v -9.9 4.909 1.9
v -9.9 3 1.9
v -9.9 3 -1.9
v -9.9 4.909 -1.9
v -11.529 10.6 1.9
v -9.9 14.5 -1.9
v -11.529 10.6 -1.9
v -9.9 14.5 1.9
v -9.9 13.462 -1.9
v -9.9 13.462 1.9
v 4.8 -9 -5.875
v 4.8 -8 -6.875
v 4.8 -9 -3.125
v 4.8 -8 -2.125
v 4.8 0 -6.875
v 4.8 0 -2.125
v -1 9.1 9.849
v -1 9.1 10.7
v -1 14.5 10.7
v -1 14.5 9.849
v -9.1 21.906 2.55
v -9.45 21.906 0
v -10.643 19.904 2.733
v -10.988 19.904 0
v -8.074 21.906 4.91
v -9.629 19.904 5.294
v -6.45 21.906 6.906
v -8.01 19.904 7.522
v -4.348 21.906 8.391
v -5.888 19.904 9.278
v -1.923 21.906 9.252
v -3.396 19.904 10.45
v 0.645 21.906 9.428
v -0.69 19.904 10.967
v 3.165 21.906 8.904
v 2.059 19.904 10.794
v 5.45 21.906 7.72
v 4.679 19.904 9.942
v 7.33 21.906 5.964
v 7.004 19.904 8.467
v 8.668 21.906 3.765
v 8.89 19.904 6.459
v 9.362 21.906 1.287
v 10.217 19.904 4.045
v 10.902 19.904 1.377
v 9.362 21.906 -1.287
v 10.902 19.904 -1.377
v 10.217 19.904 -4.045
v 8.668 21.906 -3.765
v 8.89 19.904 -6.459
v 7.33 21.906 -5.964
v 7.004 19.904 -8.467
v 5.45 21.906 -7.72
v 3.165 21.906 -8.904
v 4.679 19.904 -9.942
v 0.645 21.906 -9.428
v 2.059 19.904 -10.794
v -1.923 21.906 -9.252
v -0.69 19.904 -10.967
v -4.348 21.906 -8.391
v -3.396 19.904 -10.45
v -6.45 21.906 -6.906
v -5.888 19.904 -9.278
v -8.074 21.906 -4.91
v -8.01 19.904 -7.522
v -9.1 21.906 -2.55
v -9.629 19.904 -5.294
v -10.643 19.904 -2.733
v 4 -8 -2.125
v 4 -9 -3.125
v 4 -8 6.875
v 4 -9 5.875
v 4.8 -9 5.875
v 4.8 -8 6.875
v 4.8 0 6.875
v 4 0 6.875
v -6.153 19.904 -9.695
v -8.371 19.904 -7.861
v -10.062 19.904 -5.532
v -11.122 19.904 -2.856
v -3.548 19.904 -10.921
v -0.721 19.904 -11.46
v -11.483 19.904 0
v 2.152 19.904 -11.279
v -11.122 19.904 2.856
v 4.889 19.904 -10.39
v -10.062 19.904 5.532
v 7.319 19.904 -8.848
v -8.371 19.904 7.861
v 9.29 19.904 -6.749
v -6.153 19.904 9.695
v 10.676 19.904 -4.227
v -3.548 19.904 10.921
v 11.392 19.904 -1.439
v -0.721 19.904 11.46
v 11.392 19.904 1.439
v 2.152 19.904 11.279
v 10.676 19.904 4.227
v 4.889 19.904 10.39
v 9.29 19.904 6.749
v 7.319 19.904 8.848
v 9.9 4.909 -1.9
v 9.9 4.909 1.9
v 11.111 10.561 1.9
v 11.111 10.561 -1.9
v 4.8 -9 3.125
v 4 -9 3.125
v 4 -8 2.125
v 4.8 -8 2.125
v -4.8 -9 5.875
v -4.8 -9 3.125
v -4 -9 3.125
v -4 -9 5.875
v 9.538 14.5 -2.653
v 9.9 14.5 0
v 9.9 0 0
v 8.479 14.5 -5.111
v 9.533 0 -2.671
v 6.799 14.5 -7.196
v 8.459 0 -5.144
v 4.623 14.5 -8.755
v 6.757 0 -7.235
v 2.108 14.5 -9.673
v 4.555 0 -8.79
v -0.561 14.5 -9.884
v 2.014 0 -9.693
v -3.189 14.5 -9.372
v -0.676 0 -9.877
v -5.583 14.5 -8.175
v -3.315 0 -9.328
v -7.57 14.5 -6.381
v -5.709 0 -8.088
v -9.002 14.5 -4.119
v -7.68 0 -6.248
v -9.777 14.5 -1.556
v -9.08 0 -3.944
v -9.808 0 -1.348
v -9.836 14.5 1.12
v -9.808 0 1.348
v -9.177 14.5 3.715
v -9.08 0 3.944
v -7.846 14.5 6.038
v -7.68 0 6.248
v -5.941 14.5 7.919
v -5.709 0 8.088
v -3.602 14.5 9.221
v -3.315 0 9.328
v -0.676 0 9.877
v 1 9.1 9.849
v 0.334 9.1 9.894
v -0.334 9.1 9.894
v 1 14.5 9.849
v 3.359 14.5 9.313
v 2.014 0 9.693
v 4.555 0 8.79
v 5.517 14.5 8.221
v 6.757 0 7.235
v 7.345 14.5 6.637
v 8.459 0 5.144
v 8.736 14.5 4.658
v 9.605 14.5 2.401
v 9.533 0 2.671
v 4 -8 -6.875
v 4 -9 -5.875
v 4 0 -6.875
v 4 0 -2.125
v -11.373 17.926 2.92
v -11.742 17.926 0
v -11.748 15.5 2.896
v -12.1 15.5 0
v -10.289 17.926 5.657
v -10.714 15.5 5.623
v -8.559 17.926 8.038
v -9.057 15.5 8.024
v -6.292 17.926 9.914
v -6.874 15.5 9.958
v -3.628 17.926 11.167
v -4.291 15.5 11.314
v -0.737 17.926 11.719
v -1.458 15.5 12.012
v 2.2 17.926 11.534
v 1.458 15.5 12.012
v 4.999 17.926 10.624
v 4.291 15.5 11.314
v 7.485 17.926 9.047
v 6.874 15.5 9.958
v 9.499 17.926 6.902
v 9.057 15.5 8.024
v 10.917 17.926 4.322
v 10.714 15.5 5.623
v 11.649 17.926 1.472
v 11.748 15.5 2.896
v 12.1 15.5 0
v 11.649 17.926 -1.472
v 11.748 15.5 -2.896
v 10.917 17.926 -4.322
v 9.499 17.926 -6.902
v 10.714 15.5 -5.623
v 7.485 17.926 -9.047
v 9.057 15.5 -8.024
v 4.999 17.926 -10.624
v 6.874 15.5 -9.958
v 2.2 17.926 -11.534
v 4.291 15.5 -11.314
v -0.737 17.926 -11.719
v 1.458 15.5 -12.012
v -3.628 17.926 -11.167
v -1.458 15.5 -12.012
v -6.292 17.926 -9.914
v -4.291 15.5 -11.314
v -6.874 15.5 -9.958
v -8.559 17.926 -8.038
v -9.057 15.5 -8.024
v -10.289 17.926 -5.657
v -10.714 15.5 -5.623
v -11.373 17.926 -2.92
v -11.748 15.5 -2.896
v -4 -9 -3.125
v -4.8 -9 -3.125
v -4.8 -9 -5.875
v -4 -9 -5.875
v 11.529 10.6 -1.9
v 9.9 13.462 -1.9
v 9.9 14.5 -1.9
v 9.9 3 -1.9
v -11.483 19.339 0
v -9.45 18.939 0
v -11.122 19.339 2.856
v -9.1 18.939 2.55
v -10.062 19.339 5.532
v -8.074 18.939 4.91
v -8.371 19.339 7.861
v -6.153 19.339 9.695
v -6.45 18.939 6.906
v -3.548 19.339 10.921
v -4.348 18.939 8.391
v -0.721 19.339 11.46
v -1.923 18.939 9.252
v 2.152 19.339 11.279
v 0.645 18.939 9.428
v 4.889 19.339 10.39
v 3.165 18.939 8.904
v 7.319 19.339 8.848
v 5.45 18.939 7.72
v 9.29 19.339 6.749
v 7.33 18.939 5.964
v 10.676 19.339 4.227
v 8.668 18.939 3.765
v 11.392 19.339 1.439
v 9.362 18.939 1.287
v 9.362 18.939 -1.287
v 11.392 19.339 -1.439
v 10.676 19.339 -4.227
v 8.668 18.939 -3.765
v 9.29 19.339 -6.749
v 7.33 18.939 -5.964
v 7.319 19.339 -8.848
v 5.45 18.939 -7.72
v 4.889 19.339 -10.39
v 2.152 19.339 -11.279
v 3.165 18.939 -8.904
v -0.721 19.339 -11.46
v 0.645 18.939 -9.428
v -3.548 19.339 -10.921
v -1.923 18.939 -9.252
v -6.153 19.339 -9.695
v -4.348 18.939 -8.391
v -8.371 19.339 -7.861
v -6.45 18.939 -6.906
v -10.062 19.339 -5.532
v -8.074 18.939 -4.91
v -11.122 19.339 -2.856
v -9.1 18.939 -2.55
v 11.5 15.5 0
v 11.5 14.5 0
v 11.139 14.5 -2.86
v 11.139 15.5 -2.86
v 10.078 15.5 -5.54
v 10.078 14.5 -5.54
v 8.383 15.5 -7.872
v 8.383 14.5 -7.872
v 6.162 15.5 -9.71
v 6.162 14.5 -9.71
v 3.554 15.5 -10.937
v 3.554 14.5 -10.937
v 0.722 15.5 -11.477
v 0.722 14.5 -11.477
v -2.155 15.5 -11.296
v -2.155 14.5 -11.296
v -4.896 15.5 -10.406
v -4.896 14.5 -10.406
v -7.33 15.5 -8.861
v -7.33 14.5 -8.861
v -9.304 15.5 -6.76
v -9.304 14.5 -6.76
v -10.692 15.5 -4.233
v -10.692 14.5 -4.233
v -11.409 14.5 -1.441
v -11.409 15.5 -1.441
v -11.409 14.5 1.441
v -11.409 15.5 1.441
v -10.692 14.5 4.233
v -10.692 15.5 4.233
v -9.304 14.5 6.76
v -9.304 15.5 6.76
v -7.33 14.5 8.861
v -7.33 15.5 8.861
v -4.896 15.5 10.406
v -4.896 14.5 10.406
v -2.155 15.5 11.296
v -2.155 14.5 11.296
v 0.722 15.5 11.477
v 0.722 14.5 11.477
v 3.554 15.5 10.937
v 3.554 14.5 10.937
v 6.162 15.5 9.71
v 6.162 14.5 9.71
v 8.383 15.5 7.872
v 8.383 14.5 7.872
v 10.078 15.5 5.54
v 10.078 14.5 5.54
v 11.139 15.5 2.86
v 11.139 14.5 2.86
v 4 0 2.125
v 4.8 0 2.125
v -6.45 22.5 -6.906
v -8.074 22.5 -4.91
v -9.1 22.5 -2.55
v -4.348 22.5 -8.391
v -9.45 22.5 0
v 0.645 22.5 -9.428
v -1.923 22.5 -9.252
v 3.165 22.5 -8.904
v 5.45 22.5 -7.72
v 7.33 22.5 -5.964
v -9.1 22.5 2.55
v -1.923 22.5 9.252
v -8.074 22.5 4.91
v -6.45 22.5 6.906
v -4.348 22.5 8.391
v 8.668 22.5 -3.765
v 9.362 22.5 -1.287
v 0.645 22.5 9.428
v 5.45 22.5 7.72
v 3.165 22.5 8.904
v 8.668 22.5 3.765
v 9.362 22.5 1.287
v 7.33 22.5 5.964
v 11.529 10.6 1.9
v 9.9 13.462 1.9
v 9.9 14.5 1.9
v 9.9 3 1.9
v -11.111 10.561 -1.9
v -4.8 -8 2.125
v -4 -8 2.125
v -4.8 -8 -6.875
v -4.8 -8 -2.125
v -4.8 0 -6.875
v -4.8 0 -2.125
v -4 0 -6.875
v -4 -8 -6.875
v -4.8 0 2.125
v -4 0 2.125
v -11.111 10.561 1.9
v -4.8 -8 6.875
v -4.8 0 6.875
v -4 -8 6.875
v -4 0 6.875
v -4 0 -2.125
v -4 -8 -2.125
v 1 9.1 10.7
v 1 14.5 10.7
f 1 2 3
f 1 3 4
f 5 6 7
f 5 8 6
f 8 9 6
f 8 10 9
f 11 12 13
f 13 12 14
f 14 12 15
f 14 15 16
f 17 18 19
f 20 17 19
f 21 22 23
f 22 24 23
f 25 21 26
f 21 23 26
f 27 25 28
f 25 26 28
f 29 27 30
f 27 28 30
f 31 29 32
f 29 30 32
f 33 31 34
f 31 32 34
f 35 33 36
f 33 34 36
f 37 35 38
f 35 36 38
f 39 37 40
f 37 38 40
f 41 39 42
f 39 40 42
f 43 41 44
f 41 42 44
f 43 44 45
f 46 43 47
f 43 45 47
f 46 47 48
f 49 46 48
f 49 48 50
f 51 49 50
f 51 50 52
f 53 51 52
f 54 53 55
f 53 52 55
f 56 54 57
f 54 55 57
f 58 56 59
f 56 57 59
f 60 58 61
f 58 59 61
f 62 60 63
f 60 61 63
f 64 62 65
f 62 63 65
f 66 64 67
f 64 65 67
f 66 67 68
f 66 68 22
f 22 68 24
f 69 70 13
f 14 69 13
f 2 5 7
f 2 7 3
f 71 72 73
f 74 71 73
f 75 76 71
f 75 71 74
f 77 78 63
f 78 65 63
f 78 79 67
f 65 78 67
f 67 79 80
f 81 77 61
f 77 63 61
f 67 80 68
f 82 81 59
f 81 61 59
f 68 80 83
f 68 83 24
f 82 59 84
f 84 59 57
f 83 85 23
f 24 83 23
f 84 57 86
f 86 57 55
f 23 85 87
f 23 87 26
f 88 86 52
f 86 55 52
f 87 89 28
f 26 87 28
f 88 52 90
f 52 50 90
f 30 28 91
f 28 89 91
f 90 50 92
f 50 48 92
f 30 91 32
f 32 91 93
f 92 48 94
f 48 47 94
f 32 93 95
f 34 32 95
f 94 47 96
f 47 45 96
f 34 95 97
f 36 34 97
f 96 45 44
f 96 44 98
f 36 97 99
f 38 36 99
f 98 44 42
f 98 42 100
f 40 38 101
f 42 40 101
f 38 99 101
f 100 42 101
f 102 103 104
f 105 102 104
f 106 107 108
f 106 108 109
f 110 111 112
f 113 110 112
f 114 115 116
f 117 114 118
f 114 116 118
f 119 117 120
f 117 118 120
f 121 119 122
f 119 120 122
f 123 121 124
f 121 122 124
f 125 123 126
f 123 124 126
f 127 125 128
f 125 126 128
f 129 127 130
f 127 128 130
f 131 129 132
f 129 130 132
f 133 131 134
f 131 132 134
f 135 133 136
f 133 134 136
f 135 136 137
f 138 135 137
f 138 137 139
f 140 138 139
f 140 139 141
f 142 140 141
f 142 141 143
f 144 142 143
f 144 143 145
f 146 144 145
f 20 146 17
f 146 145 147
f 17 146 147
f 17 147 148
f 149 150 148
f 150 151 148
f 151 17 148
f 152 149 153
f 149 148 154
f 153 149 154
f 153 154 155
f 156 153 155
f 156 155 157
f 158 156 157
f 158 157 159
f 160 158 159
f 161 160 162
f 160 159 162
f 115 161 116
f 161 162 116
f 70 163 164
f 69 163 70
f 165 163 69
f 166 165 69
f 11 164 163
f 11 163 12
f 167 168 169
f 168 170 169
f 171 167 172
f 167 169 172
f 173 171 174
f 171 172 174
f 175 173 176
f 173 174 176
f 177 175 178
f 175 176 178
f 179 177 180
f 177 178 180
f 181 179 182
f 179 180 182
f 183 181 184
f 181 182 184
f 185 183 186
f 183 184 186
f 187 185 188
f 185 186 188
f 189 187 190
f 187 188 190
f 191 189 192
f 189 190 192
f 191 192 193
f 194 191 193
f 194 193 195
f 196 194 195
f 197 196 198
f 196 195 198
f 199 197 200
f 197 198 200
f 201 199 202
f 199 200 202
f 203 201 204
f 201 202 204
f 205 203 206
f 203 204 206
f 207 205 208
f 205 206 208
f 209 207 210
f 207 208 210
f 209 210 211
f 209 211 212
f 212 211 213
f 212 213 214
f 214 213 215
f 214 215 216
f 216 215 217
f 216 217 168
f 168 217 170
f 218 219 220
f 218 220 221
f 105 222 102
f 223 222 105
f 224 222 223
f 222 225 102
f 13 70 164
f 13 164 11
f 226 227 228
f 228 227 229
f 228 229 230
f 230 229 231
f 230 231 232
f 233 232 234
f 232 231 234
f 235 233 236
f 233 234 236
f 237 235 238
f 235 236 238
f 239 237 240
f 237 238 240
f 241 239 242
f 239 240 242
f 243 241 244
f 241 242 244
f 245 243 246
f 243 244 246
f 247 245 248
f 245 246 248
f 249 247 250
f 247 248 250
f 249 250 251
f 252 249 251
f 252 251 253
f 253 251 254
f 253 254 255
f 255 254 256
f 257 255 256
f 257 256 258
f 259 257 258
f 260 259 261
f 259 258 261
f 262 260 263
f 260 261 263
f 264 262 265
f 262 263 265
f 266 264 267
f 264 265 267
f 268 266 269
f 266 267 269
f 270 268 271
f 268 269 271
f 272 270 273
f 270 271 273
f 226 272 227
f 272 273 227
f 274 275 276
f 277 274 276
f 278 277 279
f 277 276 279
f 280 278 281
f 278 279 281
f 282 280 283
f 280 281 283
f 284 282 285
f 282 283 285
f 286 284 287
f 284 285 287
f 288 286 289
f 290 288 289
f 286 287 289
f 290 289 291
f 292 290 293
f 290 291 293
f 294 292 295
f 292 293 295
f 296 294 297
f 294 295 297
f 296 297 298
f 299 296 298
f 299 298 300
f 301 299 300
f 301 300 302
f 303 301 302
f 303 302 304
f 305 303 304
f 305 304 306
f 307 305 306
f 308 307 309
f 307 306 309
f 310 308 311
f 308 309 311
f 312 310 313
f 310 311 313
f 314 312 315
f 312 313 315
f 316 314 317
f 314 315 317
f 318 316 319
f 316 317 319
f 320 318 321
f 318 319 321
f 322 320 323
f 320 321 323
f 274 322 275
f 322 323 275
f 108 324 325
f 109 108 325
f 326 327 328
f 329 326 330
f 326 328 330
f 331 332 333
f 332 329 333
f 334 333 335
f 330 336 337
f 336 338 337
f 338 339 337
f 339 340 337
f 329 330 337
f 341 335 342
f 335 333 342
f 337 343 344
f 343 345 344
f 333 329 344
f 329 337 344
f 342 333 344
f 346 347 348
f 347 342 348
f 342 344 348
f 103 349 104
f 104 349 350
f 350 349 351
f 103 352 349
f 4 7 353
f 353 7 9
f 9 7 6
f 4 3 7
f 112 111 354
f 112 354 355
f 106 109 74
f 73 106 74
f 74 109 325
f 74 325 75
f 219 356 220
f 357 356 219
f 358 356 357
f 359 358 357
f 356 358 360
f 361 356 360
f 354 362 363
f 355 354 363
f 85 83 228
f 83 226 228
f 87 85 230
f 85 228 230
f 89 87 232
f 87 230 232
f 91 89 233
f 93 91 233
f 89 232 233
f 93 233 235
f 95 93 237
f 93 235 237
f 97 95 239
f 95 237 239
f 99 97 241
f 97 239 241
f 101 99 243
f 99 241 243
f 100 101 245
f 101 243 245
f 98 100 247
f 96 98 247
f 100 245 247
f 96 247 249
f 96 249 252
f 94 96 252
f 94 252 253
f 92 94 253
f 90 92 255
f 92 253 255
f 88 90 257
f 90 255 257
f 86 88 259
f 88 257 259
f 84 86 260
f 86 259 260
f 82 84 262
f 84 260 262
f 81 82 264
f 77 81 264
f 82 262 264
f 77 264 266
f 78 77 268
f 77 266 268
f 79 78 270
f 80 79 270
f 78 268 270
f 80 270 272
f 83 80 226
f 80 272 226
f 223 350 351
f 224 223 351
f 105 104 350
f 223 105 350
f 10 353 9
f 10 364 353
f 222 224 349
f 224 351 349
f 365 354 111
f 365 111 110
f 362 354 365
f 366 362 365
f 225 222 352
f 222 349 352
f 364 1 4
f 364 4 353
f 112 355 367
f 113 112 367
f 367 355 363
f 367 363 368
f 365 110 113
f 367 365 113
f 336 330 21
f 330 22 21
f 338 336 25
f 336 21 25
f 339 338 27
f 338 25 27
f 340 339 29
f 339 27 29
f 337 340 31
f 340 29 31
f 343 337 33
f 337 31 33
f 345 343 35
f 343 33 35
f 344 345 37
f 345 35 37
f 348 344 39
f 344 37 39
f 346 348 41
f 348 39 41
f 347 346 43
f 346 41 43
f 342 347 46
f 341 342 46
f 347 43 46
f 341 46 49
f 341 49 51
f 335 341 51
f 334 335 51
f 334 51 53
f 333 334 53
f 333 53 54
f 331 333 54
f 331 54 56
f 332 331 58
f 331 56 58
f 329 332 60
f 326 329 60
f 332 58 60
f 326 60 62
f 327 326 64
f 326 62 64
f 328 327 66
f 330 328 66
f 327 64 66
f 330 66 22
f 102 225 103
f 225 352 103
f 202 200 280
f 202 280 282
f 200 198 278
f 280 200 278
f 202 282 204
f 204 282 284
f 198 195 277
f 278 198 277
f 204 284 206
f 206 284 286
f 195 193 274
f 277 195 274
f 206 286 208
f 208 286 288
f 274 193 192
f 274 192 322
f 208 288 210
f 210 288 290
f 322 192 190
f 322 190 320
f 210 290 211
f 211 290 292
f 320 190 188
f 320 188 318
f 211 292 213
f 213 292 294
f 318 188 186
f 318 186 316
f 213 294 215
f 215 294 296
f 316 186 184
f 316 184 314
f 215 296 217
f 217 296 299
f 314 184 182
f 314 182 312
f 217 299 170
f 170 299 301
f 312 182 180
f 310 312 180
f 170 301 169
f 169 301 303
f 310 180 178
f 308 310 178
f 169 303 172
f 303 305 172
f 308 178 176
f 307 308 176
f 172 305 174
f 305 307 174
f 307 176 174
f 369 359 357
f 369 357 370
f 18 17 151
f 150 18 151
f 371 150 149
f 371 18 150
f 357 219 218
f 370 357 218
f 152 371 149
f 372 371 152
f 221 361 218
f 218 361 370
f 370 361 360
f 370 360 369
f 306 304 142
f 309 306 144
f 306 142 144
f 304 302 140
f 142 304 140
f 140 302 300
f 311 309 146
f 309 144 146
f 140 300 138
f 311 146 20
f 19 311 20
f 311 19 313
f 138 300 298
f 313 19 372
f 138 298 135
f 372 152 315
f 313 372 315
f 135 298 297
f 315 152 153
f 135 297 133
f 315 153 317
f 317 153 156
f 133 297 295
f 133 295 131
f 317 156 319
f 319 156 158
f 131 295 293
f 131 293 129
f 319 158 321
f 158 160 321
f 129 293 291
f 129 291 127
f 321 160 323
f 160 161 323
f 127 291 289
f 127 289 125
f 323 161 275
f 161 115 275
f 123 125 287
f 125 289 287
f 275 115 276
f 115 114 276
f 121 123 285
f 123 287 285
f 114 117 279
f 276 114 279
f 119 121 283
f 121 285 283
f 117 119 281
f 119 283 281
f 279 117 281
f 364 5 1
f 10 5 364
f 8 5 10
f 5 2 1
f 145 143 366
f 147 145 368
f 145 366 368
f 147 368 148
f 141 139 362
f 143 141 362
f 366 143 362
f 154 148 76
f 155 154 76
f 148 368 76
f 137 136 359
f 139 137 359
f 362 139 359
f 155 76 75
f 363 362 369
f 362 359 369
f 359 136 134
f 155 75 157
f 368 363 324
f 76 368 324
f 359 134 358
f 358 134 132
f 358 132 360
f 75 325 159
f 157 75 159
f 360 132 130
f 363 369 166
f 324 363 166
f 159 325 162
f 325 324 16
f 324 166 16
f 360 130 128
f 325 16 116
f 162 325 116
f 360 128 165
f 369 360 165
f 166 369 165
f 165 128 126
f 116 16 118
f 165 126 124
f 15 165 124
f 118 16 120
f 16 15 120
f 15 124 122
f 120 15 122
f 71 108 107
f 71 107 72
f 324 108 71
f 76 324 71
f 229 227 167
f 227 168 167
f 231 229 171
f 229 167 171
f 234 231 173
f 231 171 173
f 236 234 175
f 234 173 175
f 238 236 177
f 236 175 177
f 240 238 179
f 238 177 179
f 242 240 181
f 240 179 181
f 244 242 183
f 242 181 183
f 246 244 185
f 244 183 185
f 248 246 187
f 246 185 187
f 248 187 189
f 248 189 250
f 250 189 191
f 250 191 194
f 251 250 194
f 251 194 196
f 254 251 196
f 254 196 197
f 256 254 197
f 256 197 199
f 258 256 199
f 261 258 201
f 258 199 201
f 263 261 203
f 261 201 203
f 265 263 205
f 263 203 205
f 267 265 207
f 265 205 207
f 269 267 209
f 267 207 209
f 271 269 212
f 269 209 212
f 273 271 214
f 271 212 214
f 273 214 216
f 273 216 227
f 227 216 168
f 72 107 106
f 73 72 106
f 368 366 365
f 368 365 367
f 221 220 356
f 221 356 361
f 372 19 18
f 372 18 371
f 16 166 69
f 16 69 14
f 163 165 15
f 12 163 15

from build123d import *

# Parameters (mm, degrees)
SKETCH1_R             = 9.9
BOSS_EXTRUDE1_DEPTH   = 14.5
SKETCH2_R             = 11.5
BOSS_EXTRUDE2_DEPTH   = 1
BOSS_EXTRUDE3_REACH   = 24.2
SKETCH3_W             = 2
SKETCH3_H             = 5.4
BOSS_EXTRUDE4_DEPTH   = 1.9
BOSS_EXTRUDE4_2_DEPTH = 1.9
SKETCH6_W             = 0.8
SKETCH6_H             = 4.75
BOSS_EXTRUDE5_DEPTH   = 9
CHAMFER1_SIZE         = 1


with BuildPart() as part:
    # Sketch1 → Boss-Extrude1 (new body)
    with BuildSketch(Plane(origin=(0, 0, 0), x_dir=(1, 0, 0), z_dir=(0, 1, 0))):
        Circle(SKETCH1_R)
    extrude(amount=BOSS_EXTRUDE1_DEPTH)

    # Sketch2 → Boss-Extrude2 (add)
    with BuildSketch(Plane(origin=(0, 14.5, 0), x_dir=(1, 0, 0), z_dir=(0, 1, 0))):
        Circle(SKETCH2_R)
    extrude(amount=BOSS_EXTRUDE2_DEPTH)

    # Sketch3 → Boss-Extrude3 (add, up to next)
    with BuildSketch(Plane.XY.offset(10.7), mode=Mode.PRIVATE) as boss_extrude3_sk1:
        with Locations((0, 11.8)):
            Rectangle(SKETCH3_W, SKETCH3_H)
    boss_extrude3_tool1 = extrude(boss_extrude3_sk1.sketch, amount=-BOSS_EXTRUDE3_REACH, mode=Mode.PRIVATE) - part.part
    add(boss_extrude3_tool1.solids().sort_by_distance((0, 11.8, 10.7))[0])

    # Sketch5 → Revolve1 (revolve)
    with BuildSketch(Plane.XY):
        Polygon((-12.1, 15.5), (0, 15.5), (0, 22.5), (-9.45, 22.5), (-9.45, 21.906088168), (-10.98819494, 19.904143901), (-11.482792935, 19.904143901), (-11.482792935, 19.338889049), (-9.45, 18.938500196), (-11.741868076, 17.92575192), align=None)
    revolve(axis=Axis((0, 0, 0), (0, 1, 0)))

    # Sketch6 → Boss-Extrude5 (add)
    with BuildSketch(Plane.XZ):
        with Locations((-4.4, 4.5)):
            Rectangle(SKETCH6_W, SKETCH6_H)
        with Locations((-4.4, -4.5)):
            Rectangle(SKETCH6_W, SKETCH6_H)
        with Locations((4.4, 4.5)):
            Rectangle(SKETCH6_W, SKETCH6_H)
        with Locations((4.4, -4.5)):
            Rectangle(SKETCH6_W, SKETCH6_H)
    extrude(amount=BOSS_EXTRUDE5_DEPTH)

    # Chamfer1
    chamfer1_edges = [part.edges().sort_by_distance(p)[0] for p in [
        (-4.4, -9, 2.125),
        (-4.4, -9, 6.875),
        (-4.4, -9, -6.875),
        (-4.4, -9, -2.125),
        (4.4, -9, 2.125),
        (4.4, -9, 6.875),
        (4.4, -9, -6.875),
        (4.4, -9, -2.125),
    ]]
    chamfer(chamfer1_edges, length=CHAMFER1_SIZE)


with BuildPart() as body_2:
    # Sketch4 → Boss-Extrude4 (new body, symmetric)
    with BuildSketch(Plane.XY):
        Polygon((-9.9, 14.5), (-11.528661289, 10.6), (-9.9, 3), (-9.9, 4.908942102), (-11.111306166, 10.56139232), (-9.9, 13.461991774), align=None)
    extrude(amount=BOSS_EXTRUDE4_DEPTH, both=True)


with BuildPart() as body_3:
    # Sketch4 → Boss-Extrude4 2 (new body, symmetric)
    with BuildSketch(Plane.XY):
        Polygon((9.9, 13.461991774), (9.9, 14.5), (11.528661289, 10.6), (9.9, 3), (9.9, 4.908942102), (11.111306166, 10.56139232), align=None)
    extrude(amount=BOSS_EXTRUDE4_2_DEPTH, both=True)


solid = Compound([part.part, body_2.part, body_3.part])
